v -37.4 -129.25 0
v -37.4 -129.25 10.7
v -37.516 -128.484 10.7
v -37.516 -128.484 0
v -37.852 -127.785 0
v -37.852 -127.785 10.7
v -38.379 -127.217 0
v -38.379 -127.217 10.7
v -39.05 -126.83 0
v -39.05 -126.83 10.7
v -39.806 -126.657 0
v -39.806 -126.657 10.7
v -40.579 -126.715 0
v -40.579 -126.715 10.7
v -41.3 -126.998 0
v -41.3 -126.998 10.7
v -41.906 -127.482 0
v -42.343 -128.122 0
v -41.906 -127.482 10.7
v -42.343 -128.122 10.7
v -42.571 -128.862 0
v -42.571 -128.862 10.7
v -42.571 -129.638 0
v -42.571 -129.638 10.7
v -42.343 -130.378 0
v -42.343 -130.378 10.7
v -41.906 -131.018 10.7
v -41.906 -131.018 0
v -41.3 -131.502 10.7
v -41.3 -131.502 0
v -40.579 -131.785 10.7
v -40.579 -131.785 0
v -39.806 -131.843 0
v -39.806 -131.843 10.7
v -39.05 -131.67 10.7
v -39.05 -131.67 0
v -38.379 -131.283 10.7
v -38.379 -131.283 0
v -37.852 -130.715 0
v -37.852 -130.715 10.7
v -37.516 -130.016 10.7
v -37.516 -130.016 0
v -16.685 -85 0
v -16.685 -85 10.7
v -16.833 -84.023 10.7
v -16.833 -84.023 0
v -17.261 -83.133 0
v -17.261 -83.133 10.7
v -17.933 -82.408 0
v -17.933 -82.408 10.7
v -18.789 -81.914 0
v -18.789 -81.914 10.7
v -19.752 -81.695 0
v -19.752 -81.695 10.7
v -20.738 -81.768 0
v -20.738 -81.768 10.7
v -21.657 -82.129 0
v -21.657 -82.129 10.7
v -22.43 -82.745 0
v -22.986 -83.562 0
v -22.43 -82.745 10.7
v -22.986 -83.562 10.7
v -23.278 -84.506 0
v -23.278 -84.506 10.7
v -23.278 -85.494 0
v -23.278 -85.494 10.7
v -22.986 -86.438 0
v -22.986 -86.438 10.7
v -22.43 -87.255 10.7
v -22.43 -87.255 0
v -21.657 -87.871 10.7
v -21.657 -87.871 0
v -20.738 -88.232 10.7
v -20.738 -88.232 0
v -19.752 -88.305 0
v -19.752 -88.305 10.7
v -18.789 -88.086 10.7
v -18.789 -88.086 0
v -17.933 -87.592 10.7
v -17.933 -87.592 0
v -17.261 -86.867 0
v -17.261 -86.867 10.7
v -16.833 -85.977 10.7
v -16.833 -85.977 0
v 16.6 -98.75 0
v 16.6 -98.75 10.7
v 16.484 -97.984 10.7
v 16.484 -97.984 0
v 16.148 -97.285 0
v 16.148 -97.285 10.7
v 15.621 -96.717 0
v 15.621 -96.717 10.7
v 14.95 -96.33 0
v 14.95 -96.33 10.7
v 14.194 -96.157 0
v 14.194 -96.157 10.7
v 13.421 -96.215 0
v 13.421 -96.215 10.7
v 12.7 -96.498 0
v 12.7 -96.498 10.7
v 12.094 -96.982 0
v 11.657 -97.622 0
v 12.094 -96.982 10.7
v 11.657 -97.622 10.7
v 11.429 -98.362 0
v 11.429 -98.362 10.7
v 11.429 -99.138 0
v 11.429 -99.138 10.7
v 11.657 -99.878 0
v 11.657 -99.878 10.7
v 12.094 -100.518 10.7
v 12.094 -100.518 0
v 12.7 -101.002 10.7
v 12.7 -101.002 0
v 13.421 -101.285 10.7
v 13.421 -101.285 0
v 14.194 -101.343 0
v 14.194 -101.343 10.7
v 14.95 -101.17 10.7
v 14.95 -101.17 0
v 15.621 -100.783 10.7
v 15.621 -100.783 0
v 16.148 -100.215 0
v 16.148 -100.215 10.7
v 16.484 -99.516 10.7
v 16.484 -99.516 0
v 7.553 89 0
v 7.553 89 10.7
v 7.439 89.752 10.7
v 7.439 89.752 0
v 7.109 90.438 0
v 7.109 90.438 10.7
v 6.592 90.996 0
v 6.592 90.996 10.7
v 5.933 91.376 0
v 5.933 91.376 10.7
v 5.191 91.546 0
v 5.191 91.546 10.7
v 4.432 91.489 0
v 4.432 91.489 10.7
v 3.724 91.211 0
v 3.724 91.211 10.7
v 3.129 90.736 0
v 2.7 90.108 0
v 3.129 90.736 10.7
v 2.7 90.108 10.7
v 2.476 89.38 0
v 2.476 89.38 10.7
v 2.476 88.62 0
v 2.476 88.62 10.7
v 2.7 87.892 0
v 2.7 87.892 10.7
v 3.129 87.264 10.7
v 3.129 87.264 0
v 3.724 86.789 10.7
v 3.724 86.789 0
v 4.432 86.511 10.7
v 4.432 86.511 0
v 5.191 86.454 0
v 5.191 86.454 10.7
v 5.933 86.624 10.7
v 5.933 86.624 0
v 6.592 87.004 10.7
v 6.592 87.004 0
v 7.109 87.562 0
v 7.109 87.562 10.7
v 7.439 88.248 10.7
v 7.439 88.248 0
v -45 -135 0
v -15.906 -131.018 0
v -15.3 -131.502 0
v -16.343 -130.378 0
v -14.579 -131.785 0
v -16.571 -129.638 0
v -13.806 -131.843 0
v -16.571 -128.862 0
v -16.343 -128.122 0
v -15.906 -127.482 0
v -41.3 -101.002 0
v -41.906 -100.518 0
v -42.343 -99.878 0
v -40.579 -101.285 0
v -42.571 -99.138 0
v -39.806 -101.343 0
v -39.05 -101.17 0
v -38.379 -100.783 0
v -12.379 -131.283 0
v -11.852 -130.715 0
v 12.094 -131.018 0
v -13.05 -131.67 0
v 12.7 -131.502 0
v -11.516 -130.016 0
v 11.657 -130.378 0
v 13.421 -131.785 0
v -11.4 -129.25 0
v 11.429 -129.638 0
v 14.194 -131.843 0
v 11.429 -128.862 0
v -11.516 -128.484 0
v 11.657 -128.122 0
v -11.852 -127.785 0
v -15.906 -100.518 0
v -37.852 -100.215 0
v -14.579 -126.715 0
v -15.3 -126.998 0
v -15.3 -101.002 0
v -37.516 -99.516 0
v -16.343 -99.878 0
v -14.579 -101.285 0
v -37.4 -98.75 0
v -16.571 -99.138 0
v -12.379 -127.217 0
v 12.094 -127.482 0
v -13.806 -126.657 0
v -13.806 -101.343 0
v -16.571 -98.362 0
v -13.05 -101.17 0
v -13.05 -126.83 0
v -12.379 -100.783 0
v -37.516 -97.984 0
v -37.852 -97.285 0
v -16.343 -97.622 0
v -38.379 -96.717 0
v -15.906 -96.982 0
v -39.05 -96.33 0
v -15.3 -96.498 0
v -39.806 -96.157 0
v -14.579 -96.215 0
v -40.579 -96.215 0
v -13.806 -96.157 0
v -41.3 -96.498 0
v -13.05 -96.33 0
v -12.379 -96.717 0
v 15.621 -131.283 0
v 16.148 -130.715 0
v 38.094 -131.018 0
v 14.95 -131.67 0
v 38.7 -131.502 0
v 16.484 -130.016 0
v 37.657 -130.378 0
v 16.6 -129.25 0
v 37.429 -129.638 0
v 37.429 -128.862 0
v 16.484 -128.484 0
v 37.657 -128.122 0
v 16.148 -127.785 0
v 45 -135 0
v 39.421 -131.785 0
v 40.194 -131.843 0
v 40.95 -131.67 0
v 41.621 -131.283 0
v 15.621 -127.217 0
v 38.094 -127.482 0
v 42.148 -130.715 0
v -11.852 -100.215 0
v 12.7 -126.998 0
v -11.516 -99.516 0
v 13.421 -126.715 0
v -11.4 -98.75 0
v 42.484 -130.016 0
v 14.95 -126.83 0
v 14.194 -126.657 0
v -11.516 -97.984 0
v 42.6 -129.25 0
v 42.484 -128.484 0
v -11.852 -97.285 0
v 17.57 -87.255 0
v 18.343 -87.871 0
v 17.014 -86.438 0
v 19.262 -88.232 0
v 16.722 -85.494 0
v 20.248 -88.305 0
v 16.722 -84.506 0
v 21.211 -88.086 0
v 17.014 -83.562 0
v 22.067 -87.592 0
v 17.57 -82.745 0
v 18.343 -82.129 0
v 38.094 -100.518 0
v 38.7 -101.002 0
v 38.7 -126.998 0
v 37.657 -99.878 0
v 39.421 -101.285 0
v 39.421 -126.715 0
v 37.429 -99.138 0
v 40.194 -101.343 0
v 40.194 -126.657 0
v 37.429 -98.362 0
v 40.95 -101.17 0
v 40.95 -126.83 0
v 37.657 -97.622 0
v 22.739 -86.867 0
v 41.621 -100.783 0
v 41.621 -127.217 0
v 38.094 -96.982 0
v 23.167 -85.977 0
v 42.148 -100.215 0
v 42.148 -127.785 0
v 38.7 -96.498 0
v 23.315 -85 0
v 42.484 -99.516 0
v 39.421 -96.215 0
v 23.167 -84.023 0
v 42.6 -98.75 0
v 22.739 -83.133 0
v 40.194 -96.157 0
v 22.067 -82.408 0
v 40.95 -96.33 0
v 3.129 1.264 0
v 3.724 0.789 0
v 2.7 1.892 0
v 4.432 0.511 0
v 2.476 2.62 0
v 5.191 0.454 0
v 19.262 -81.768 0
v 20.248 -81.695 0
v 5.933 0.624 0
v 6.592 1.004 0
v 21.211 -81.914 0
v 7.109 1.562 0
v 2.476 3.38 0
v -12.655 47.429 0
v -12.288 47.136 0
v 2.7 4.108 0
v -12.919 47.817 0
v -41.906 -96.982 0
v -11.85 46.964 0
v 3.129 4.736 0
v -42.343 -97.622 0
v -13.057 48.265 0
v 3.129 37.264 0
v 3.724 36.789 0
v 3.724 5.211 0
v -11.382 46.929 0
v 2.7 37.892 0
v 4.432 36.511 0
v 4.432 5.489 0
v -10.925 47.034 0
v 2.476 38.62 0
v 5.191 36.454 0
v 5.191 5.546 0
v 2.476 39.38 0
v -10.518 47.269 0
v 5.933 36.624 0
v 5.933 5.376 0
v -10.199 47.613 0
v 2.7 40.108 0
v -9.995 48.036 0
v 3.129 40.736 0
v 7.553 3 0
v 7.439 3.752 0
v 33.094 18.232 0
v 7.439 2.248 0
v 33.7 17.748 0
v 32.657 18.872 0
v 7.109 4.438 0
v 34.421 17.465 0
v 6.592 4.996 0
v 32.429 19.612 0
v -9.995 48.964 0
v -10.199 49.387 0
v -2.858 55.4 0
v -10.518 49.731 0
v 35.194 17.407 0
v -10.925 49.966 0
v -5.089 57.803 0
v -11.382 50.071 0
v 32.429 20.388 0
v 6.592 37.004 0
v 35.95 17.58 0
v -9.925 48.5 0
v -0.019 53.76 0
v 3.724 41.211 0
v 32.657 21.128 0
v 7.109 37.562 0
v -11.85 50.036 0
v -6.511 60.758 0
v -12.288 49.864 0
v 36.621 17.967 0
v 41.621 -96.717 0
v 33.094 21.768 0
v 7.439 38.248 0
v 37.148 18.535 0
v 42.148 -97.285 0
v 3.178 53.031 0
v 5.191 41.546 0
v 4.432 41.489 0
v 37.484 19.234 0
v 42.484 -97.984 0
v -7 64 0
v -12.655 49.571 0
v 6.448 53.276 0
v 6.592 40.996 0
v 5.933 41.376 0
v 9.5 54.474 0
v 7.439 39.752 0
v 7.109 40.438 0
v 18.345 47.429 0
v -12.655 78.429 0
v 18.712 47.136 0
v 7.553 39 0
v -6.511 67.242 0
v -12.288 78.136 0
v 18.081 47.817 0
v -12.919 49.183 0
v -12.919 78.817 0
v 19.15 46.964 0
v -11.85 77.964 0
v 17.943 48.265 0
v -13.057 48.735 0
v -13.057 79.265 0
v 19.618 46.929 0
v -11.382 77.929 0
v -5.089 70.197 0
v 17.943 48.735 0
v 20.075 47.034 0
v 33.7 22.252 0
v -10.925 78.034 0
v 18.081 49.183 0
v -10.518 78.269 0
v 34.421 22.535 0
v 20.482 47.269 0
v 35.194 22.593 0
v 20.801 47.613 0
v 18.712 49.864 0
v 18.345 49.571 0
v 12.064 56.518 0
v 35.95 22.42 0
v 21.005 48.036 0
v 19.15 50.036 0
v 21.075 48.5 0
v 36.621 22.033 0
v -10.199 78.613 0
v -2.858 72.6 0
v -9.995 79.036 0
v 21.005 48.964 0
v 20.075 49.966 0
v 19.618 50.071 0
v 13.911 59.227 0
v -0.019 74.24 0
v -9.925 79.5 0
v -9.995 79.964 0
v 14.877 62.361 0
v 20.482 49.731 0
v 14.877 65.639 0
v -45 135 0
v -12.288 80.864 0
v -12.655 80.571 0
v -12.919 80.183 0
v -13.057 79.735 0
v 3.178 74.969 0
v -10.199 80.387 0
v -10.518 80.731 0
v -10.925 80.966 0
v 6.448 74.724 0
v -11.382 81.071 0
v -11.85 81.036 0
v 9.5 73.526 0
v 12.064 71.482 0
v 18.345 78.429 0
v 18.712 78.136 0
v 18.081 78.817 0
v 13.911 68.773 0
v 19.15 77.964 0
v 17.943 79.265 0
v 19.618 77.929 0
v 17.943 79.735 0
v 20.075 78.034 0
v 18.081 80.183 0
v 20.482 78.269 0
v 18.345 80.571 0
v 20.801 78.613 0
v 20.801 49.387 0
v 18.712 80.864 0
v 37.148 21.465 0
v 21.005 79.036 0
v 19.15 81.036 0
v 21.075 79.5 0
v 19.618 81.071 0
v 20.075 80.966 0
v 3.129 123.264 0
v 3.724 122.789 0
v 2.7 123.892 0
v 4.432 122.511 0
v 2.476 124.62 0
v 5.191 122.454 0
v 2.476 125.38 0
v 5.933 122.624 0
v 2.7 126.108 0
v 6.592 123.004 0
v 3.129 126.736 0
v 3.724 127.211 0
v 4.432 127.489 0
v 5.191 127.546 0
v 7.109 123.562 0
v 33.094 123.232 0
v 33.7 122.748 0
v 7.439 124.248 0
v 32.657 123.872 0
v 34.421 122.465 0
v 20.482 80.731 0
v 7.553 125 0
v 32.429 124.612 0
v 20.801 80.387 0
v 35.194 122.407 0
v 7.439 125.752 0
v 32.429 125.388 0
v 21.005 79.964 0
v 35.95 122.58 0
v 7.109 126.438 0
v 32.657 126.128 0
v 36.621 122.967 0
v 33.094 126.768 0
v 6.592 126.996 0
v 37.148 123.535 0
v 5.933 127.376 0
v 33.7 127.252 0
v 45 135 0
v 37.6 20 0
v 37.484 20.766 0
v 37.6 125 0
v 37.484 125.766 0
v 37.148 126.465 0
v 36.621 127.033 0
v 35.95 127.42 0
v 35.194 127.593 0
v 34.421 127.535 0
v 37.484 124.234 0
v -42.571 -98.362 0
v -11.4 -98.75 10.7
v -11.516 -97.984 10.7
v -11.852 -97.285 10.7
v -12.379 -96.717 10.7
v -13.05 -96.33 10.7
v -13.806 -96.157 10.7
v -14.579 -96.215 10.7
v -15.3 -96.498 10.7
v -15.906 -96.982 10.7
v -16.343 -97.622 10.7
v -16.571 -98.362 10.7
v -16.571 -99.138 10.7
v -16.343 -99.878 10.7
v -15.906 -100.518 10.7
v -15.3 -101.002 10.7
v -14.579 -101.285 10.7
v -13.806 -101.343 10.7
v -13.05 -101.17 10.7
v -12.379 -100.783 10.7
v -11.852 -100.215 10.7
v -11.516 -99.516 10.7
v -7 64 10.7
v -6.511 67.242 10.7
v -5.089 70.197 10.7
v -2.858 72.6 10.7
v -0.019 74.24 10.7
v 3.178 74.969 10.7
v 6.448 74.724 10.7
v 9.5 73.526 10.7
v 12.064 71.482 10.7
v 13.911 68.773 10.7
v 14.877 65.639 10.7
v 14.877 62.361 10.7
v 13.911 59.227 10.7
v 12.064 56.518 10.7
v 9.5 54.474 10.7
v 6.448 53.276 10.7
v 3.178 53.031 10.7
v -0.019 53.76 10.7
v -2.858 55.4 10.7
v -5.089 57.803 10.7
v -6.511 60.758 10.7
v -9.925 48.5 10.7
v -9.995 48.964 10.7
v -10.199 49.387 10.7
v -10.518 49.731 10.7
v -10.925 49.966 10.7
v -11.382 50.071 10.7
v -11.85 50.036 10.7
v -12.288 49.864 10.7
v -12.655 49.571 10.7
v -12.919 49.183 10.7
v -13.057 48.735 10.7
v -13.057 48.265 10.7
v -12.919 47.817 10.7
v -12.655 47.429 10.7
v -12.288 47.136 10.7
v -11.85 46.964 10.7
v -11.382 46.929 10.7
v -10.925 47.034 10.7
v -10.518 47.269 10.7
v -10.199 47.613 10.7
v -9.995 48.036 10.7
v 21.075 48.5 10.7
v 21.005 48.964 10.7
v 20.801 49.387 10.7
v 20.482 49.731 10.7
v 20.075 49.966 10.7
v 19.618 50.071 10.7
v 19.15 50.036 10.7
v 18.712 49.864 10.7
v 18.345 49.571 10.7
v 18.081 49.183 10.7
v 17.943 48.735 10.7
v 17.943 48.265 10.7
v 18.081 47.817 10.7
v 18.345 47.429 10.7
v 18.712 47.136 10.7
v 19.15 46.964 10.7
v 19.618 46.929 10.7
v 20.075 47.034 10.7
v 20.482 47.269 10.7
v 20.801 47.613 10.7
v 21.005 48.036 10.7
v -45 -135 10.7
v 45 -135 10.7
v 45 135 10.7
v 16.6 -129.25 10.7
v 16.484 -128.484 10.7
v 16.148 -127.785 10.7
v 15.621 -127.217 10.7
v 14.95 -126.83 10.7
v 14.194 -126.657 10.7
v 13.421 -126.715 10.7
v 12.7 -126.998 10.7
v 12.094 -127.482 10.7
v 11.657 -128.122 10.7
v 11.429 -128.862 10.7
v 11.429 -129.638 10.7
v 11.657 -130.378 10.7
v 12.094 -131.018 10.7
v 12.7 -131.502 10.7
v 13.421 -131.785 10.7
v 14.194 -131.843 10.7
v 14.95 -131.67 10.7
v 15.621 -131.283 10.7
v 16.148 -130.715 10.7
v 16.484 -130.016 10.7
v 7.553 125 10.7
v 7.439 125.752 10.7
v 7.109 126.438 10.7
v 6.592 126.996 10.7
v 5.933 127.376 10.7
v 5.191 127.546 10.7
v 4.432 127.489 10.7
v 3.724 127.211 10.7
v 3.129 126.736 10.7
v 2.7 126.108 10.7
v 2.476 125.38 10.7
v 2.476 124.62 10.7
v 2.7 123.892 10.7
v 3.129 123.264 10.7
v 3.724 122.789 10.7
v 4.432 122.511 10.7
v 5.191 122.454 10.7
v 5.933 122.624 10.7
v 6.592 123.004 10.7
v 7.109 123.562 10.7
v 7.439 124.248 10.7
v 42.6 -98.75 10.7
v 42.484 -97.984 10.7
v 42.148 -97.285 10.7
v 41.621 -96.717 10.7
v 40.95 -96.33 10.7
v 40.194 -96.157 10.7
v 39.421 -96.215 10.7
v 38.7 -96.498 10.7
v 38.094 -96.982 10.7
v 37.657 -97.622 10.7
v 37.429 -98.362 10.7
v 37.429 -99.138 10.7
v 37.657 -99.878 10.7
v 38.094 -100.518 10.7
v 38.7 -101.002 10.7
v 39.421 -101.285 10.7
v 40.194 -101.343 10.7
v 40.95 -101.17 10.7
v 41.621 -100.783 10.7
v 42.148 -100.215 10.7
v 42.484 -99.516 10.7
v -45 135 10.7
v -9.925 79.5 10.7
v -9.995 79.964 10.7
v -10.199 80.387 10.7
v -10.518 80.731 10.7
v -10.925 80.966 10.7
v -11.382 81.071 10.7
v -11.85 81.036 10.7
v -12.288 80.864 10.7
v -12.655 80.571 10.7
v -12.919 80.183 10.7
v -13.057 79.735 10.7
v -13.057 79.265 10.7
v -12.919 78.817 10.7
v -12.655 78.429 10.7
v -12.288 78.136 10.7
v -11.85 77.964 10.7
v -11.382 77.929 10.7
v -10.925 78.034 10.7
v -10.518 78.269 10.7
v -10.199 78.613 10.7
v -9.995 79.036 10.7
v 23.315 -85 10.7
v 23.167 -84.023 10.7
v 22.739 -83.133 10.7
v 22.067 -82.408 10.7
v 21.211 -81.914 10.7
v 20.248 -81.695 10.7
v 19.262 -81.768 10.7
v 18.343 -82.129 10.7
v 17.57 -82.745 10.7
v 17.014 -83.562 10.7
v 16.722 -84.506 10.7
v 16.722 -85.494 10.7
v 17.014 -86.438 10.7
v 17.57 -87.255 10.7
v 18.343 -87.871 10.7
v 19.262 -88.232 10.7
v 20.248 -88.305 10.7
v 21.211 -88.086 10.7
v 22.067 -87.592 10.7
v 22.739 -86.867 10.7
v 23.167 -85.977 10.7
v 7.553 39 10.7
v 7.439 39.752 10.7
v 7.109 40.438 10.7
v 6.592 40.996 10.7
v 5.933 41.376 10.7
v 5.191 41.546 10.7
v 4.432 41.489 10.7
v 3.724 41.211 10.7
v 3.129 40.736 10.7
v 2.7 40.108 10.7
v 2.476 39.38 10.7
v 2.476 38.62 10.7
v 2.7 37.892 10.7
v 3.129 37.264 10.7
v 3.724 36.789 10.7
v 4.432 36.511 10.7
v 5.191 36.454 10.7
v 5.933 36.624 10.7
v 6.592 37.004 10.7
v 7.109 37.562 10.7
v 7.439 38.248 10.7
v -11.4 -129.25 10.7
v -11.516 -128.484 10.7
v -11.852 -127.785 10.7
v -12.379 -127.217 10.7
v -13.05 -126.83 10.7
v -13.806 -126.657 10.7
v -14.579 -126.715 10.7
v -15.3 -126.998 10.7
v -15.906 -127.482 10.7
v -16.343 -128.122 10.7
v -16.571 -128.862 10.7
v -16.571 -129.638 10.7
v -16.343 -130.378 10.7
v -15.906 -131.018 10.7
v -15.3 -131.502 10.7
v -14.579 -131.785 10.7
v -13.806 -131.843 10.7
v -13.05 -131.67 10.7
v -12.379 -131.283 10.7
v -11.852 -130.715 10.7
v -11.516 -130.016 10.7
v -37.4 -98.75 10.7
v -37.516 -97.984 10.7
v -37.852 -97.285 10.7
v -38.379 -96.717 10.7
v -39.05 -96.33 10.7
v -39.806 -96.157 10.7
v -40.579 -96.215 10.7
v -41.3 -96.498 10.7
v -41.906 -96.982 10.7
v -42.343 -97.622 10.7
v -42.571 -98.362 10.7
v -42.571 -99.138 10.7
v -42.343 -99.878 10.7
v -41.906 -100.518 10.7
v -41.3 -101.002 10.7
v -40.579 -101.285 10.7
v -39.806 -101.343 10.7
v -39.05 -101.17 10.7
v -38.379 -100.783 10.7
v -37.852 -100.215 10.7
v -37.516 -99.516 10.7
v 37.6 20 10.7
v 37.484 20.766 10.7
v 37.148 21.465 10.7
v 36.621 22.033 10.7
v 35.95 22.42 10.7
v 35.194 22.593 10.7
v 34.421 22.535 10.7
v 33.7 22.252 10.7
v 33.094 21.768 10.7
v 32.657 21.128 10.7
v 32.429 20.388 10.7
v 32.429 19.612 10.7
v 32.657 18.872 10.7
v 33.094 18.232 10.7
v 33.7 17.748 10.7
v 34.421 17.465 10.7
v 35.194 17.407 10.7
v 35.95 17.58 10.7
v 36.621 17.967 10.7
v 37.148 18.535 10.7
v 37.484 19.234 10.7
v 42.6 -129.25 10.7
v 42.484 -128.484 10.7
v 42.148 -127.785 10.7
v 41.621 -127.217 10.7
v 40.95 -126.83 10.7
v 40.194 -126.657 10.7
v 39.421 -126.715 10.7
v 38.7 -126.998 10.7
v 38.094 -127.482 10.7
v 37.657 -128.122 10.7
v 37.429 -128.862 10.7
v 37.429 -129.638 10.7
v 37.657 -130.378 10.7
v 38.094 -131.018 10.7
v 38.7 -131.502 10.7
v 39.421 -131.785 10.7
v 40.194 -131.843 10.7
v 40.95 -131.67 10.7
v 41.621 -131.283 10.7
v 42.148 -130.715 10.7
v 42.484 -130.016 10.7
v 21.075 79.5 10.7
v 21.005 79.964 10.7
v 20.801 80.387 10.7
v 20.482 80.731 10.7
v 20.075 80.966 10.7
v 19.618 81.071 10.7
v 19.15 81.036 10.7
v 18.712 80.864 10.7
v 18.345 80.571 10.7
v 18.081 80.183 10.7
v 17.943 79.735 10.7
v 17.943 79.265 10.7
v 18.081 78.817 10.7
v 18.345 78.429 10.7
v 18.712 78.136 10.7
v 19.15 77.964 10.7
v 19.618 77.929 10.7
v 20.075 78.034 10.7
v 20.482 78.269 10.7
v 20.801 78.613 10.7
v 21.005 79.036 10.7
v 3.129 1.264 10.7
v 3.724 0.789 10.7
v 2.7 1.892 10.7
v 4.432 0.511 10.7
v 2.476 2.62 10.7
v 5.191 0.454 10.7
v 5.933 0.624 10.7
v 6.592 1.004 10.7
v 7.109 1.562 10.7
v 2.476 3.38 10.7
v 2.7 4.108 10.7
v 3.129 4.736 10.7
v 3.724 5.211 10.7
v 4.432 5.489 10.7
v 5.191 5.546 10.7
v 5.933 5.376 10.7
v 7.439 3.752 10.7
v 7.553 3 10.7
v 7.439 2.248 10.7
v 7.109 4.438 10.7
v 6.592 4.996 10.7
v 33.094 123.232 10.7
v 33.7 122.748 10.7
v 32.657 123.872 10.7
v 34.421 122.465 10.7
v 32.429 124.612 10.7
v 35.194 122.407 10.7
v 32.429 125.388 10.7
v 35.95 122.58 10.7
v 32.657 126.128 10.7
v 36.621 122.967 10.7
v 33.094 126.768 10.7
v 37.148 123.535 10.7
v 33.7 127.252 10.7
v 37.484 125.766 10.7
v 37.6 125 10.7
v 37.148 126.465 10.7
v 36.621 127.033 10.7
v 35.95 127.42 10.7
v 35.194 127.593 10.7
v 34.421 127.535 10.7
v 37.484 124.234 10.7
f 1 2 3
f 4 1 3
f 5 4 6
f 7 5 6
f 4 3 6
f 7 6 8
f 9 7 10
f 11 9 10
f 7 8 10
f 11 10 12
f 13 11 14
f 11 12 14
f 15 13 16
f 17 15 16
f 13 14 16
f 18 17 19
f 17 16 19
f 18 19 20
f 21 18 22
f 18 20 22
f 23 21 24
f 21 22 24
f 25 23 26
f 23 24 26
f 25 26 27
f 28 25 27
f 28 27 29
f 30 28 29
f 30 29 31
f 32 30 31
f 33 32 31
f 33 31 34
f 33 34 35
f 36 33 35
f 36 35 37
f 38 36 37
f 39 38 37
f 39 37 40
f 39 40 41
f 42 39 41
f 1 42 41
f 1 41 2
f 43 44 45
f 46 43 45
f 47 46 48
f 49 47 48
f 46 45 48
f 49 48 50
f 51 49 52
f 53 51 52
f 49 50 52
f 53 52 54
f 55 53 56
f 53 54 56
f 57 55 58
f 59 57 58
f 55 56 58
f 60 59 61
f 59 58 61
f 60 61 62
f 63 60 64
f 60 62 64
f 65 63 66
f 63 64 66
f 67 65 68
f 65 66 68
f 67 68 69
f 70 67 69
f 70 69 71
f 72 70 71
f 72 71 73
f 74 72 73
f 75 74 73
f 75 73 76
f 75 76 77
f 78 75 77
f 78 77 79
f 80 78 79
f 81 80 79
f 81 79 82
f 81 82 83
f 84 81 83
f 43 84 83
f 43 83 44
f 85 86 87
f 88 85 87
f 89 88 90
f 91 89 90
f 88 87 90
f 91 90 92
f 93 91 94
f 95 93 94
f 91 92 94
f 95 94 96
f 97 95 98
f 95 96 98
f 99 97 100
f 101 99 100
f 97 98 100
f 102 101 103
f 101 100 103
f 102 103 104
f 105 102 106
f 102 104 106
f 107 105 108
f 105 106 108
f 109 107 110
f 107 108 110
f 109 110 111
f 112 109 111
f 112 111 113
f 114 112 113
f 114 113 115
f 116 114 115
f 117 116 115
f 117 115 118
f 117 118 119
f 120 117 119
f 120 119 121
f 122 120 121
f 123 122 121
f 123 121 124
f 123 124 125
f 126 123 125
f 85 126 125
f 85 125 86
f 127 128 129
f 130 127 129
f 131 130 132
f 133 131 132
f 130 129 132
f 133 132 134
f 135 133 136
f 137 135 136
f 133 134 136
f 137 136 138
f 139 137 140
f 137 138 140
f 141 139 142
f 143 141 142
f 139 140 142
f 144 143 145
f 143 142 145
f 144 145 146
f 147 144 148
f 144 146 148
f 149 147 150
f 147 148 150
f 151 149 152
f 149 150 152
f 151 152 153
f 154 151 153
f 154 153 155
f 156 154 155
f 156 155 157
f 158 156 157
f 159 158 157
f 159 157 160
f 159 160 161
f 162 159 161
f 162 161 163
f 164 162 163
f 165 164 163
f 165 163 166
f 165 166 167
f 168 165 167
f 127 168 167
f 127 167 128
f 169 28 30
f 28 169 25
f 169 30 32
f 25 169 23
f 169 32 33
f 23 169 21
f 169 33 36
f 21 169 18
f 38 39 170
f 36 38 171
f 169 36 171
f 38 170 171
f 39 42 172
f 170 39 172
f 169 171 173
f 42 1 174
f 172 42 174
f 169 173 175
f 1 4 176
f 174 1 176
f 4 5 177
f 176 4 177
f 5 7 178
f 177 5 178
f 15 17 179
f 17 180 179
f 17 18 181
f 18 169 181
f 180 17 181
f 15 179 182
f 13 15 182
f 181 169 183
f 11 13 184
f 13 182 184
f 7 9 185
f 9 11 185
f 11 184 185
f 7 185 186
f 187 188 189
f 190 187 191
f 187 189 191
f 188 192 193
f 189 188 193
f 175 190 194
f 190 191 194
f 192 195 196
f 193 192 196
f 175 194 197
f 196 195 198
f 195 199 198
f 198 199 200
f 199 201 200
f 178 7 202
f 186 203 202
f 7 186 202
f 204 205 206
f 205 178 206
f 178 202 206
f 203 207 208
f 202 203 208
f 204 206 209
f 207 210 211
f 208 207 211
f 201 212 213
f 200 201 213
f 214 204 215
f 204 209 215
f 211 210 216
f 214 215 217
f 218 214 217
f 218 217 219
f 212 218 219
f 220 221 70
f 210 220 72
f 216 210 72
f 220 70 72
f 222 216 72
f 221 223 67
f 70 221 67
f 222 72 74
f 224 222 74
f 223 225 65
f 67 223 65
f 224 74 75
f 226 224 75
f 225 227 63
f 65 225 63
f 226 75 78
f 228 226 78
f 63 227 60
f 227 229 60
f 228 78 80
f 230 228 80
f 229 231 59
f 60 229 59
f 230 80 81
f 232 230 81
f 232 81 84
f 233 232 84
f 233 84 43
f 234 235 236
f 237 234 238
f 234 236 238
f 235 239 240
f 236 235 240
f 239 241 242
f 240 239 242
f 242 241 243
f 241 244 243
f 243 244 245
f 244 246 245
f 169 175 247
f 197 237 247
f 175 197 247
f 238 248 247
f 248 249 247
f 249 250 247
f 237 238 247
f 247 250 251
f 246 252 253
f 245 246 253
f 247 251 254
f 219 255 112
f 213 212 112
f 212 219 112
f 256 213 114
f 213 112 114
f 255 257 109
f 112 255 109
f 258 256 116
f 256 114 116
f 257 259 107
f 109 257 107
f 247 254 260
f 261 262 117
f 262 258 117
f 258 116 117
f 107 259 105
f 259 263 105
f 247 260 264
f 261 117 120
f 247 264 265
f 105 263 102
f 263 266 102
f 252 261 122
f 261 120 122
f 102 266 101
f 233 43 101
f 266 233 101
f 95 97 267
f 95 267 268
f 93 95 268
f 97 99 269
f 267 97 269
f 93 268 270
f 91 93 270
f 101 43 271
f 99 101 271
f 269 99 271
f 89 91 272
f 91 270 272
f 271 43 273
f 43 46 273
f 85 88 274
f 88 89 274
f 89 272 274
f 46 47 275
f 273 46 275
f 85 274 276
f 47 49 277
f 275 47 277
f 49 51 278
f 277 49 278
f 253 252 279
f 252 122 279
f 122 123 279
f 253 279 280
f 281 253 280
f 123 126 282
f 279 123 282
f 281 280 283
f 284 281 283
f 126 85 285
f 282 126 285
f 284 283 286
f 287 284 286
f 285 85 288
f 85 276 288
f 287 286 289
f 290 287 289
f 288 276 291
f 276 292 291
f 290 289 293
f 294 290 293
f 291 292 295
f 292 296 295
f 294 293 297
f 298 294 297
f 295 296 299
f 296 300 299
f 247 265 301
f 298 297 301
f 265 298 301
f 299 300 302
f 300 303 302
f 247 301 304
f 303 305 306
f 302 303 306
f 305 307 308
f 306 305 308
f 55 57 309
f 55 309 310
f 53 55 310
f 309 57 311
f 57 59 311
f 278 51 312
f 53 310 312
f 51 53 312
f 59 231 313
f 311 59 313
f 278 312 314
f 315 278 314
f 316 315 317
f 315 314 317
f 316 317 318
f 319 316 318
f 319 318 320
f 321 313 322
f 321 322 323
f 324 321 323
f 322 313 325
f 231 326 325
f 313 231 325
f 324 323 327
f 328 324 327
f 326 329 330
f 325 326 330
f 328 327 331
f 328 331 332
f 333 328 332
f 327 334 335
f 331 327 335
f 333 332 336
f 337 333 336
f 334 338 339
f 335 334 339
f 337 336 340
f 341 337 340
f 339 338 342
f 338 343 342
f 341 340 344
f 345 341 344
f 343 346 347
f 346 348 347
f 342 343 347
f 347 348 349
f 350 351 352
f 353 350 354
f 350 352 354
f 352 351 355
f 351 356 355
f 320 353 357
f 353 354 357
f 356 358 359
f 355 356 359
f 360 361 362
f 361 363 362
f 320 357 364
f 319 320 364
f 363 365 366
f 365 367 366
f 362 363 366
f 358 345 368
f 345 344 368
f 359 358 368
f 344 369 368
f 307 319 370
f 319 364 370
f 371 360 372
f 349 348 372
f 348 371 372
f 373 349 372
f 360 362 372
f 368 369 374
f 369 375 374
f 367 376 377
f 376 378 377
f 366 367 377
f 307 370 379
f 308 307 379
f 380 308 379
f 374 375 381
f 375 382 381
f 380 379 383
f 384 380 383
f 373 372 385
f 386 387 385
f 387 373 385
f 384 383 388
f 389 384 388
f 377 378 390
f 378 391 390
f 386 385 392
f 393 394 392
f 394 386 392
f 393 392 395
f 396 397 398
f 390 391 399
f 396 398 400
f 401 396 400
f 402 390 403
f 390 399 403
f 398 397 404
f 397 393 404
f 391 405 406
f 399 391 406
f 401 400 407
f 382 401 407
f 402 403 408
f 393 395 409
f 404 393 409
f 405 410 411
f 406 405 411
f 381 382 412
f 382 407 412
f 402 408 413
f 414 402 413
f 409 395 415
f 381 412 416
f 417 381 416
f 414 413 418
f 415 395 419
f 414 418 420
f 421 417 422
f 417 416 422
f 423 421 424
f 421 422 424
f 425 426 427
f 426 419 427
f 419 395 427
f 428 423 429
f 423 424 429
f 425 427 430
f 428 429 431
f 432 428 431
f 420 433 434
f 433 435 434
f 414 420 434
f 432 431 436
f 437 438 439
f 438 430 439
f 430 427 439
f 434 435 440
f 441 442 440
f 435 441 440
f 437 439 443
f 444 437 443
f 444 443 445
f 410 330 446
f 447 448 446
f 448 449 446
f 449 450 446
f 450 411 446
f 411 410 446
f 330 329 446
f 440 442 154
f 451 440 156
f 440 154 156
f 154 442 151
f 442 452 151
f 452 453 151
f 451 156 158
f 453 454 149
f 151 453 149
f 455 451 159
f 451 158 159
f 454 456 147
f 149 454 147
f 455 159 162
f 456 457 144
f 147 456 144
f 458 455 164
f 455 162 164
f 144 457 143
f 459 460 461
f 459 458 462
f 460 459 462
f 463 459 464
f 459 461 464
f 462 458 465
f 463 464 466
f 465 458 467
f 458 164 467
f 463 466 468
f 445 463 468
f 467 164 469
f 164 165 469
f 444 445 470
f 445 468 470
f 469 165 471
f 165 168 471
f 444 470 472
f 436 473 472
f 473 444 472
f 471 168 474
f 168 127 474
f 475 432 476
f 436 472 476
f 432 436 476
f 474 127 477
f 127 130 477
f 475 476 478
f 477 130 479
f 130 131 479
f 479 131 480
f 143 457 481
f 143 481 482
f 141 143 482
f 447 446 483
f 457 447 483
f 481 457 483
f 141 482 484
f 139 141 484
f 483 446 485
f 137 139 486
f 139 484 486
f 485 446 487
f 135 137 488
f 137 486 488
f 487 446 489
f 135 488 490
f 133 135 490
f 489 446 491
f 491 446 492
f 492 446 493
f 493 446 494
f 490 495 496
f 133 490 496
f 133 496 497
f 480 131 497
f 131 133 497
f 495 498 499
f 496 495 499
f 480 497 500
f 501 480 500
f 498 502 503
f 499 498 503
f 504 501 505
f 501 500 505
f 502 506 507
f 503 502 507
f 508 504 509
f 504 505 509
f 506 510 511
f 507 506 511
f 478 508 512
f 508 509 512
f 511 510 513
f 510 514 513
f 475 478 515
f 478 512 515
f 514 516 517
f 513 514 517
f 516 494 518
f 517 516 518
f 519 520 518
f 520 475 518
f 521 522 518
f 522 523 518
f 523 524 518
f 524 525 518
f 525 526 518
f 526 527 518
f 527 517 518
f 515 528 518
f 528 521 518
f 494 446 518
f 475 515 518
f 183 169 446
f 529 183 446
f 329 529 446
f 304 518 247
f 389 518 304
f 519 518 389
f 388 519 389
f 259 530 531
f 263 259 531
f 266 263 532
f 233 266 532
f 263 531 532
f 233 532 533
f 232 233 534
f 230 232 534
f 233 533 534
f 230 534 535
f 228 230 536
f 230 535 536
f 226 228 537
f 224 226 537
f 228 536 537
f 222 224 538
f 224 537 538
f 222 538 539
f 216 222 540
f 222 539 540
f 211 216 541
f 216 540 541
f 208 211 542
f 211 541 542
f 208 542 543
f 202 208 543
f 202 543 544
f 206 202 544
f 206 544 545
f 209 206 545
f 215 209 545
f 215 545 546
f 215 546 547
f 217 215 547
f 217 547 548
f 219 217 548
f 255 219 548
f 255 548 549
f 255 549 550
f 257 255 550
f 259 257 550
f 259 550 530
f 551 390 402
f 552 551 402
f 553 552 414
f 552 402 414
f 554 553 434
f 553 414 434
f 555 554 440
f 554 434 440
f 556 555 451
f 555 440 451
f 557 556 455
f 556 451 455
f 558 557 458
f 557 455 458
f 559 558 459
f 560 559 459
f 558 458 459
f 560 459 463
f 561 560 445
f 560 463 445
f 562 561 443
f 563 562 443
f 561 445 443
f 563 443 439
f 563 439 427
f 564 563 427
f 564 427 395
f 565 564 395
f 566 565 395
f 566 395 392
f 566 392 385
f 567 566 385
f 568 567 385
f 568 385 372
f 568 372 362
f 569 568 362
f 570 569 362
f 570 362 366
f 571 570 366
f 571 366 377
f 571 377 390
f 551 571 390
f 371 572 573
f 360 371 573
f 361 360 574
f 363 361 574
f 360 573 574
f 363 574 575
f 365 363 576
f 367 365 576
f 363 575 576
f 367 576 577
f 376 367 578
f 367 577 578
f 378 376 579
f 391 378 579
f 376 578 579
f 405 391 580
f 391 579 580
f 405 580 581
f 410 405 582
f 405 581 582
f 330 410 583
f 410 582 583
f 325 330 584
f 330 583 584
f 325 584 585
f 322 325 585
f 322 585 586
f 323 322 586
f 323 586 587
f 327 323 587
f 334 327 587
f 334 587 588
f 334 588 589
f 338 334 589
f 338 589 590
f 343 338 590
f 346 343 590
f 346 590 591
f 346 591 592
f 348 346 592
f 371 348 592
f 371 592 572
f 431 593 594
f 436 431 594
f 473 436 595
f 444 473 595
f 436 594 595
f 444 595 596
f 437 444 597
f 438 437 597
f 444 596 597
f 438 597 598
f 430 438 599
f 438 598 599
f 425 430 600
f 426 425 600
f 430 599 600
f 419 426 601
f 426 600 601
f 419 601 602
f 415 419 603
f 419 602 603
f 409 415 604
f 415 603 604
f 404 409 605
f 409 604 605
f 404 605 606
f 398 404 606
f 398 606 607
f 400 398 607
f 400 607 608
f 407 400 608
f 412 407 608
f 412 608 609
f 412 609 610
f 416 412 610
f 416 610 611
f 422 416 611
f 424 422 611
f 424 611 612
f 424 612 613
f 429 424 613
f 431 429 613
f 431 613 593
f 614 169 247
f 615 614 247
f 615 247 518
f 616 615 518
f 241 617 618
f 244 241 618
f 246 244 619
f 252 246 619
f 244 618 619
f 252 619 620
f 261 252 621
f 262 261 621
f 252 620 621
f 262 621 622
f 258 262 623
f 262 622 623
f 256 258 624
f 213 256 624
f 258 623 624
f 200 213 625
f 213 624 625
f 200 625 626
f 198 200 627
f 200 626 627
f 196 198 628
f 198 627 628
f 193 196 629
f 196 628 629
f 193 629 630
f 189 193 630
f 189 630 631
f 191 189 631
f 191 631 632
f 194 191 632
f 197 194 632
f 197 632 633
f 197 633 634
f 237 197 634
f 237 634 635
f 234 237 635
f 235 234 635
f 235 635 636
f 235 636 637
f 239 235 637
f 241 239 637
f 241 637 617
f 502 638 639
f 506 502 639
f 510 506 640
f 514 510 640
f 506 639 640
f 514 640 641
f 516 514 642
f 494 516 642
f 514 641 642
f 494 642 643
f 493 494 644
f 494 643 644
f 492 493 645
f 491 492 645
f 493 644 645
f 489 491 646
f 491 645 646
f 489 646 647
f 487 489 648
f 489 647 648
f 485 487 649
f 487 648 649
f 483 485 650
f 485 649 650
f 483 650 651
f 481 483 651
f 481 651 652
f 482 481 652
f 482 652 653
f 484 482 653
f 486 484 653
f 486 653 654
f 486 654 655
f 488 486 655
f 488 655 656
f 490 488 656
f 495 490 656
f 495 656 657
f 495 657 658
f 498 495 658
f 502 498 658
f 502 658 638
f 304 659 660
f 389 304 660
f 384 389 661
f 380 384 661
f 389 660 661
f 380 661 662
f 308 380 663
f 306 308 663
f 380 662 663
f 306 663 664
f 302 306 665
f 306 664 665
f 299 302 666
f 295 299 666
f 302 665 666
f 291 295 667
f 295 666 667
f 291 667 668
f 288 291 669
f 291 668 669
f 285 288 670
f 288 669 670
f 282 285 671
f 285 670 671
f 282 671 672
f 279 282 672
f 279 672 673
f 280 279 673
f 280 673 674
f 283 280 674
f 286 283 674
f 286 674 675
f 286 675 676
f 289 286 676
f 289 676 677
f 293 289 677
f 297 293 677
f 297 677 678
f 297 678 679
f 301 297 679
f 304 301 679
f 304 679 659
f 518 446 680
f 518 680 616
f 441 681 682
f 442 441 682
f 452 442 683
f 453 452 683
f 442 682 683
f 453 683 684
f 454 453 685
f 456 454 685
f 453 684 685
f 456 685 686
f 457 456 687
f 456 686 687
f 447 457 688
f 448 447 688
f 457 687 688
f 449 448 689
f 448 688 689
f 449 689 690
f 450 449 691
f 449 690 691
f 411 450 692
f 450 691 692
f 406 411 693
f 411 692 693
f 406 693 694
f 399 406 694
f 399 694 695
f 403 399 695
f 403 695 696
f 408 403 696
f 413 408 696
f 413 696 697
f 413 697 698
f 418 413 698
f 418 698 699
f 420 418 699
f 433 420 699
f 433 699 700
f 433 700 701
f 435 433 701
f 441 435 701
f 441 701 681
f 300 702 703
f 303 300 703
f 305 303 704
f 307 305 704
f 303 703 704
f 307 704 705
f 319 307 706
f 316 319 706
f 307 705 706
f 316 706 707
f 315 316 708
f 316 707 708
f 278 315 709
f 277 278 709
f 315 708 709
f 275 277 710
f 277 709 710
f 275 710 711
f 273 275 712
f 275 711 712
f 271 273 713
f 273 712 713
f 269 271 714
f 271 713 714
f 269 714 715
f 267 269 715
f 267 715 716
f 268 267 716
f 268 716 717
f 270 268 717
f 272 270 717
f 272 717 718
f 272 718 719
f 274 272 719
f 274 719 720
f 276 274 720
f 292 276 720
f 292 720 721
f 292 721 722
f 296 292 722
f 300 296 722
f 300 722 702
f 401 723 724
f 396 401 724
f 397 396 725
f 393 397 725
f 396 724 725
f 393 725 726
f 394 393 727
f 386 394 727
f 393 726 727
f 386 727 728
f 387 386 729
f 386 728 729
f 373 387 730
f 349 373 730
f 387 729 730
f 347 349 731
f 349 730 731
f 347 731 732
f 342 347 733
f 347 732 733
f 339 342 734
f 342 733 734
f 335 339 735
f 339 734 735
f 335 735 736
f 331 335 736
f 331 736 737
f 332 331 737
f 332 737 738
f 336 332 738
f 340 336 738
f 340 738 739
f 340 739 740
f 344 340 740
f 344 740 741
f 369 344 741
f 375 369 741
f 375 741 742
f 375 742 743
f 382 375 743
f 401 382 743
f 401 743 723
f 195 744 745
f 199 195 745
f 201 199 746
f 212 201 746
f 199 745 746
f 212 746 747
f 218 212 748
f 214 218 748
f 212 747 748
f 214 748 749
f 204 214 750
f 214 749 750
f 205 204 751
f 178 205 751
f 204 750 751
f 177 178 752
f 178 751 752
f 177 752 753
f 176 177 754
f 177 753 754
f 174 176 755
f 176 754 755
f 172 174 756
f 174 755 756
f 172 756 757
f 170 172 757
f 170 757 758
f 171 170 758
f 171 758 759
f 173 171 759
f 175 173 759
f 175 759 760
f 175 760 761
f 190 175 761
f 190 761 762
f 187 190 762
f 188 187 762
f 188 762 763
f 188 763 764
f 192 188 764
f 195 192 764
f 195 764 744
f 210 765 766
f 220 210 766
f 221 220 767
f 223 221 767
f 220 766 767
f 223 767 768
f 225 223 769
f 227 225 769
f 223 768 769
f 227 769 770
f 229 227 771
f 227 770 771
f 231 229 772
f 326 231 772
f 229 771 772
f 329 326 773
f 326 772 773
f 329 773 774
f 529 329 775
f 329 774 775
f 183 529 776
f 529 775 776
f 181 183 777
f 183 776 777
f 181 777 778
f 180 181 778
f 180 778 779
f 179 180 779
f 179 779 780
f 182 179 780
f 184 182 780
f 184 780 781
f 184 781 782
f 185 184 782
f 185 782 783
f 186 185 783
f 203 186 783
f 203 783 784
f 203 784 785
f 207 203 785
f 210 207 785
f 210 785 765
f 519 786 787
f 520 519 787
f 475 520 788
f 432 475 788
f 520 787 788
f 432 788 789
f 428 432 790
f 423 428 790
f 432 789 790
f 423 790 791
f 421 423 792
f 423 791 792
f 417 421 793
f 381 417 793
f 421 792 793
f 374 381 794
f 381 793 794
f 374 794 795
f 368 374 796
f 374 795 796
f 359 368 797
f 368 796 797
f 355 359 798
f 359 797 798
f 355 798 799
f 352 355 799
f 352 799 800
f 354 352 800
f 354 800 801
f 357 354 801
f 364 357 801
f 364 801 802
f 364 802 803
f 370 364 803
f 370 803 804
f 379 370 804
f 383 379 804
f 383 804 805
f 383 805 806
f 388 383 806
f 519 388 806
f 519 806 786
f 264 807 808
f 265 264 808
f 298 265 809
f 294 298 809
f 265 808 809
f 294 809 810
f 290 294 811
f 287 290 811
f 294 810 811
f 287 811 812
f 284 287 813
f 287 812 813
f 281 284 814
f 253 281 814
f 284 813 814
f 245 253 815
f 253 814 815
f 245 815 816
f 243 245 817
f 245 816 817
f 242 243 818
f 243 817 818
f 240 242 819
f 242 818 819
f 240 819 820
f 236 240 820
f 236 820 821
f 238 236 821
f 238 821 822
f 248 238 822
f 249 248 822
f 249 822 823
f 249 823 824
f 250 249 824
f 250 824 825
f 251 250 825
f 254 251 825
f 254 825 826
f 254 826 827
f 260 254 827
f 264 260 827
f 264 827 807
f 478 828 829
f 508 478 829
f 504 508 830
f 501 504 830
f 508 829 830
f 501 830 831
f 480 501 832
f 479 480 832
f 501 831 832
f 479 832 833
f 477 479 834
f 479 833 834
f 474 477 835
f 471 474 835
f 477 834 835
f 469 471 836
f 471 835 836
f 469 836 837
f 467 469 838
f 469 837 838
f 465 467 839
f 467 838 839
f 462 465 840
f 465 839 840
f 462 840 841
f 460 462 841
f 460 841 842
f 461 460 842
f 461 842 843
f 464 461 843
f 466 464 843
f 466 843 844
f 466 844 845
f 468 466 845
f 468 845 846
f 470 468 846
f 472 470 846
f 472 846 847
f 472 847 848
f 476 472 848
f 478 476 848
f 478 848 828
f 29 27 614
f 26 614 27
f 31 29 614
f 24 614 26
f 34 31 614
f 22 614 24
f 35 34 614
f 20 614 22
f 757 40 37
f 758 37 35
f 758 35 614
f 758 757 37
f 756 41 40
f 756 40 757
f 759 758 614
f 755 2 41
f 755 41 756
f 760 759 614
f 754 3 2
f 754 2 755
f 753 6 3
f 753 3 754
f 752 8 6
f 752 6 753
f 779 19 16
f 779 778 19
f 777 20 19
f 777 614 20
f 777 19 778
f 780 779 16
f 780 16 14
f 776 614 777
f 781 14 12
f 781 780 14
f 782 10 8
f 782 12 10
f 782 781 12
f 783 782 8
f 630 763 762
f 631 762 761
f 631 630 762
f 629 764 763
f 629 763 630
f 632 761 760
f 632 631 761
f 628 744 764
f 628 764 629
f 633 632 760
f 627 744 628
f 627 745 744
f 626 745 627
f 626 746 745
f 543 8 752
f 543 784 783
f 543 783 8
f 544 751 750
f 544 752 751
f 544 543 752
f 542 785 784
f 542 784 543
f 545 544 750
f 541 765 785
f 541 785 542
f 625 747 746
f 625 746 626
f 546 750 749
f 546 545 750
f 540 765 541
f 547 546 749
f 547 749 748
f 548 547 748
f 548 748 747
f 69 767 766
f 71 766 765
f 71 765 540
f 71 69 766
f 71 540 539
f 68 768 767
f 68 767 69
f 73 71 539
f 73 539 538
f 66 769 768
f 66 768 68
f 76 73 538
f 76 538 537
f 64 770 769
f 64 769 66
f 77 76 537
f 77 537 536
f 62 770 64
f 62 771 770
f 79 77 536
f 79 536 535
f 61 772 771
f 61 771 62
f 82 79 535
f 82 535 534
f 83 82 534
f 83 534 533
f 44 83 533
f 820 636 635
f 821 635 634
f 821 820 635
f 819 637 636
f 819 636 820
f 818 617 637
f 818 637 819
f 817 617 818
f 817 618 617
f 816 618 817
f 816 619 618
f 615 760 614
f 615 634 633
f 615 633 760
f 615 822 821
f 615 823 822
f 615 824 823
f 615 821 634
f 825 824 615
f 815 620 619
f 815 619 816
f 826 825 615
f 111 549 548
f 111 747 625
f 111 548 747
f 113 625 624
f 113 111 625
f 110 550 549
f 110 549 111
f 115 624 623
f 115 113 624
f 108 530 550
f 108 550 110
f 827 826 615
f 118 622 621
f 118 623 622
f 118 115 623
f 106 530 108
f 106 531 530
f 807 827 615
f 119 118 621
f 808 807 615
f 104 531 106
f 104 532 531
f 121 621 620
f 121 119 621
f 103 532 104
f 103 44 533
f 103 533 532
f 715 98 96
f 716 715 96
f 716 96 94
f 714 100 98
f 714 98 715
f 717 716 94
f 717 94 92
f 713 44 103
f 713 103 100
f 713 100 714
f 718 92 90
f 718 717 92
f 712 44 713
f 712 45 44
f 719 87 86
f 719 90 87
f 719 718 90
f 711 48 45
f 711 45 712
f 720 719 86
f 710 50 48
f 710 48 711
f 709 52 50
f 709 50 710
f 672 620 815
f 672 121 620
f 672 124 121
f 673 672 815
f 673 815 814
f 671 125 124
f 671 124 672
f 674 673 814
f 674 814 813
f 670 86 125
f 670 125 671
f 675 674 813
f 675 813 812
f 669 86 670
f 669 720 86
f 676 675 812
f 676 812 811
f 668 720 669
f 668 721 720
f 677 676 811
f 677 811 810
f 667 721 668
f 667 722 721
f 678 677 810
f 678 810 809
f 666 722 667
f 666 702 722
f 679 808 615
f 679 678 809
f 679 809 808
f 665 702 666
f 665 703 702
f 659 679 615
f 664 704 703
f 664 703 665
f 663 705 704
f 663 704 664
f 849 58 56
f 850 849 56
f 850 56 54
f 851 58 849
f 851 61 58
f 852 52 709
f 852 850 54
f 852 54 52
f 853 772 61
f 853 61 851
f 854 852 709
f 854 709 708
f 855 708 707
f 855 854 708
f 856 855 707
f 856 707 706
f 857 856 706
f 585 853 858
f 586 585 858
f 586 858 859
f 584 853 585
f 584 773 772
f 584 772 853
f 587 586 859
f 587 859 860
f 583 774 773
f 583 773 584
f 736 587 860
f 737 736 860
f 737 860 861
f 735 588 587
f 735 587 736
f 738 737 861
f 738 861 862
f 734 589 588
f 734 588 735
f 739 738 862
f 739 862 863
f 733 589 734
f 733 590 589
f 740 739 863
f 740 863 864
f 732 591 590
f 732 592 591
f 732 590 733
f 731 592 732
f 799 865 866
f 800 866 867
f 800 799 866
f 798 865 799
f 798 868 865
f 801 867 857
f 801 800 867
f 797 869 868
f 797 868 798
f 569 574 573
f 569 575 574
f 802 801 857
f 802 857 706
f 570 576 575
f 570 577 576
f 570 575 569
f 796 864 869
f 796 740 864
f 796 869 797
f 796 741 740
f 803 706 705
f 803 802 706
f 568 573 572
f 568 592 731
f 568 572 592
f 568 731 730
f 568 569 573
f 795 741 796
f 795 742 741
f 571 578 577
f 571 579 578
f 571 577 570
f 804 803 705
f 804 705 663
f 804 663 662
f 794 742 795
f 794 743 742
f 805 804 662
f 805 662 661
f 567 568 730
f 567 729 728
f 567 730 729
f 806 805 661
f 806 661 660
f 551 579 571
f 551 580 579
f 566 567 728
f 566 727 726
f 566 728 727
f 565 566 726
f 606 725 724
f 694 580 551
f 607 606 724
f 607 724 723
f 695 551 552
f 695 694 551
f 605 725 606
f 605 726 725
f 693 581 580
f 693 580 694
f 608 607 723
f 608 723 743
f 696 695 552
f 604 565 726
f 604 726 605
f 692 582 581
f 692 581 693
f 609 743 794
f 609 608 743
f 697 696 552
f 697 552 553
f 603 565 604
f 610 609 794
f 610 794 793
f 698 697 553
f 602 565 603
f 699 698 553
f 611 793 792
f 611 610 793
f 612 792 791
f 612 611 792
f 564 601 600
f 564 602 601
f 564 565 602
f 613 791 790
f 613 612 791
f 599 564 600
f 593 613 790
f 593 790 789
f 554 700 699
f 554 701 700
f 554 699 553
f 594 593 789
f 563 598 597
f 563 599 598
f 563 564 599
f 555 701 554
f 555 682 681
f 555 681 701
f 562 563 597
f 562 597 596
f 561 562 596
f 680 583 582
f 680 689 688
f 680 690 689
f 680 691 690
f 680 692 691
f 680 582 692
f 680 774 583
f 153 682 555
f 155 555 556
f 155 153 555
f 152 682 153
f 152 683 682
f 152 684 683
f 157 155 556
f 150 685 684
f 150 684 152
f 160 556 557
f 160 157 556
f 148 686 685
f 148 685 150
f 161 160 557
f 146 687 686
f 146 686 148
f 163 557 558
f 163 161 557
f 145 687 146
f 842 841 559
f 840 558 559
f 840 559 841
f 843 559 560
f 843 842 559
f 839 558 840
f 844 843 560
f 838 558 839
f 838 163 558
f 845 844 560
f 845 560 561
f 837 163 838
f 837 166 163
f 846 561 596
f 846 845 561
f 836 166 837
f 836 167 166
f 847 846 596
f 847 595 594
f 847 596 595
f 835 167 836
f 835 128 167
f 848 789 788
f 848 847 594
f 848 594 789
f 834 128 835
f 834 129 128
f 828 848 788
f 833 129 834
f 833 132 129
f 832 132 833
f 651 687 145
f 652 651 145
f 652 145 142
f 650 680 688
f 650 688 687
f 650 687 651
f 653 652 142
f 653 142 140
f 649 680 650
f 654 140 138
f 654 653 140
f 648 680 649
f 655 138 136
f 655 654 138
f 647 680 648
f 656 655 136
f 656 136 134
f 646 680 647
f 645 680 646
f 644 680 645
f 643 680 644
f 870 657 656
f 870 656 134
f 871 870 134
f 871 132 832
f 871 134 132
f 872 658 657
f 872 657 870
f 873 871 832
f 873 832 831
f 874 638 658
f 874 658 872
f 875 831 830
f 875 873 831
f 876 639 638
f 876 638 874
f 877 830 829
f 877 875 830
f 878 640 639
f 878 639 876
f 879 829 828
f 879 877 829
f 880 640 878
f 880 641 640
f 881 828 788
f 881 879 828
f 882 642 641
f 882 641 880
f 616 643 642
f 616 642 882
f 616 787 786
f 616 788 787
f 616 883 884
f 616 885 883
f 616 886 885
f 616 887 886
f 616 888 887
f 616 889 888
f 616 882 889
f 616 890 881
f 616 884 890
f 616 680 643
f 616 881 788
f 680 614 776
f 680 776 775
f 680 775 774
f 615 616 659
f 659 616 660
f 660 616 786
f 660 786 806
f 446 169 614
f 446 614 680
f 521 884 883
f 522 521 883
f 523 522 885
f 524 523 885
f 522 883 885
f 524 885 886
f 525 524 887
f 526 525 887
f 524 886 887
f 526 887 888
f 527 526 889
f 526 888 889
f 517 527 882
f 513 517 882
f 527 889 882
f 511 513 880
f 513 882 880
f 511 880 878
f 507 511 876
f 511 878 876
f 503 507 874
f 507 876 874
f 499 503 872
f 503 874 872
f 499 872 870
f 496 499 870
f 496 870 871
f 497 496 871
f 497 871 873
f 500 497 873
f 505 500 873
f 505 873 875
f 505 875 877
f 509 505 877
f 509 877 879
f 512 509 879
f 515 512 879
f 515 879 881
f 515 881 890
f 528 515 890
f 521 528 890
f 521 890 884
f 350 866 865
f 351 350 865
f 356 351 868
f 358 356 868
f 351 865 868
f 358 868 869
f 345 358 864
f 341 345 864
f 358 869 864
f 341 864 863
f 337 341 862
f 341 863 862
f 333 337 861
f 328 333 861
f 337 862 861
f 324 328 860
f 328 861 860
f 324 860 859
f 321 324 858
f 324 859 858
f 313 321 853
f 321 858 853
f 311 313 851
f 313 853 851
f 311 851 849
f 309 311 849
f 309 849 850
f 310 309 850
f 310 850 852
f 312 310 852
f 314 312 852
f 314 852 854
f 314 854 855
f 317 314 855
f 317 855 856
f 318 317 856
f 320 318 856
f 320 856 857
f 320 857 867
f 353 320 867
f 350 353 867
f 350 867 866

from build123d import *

# Parameters (mm, degrees)
ESBO_O1_W                               = 90
ESBO_O1_H                               = 270
RESSALTO_EXTRUS_O1_DEPTH                = 10.7
FURO_ROSCADO_PARA_CONDU_TE_DE_M5X0_81_D = 5.2
FURO_ROSCADO_PARA_CONDU_TE_DE_1_4_281_D = 6.6294
FURO_ROSCADO_PARA_CONDU_TE_DE_M5X0_82_D = 5.2
FURO_ROSCADO_PARA_CONDU_TE_DE_10_321_D  = 5.1054
ESBO_O14_R                              = 11
CORTE_EXTRUS_O1_DEPTH                   = 11.7
FURO_ROSCADO_PARA_CONDU_TE_DE_M3X0_51_D = 3.15


with BuildPart() as part:
    # Esboço1 → Ressalto-extrusão1 (new body)
    with BuildSketch(Plane.XY):
        Rectangle(ESBO_O1_W, ESBO_O1_H)
    extrude(amount=RESSALTO_EXTRUS_O1_DEPTH)

    # Furo roscado para conduíte de M5x0.81 (through all)
    with Locations(Plane(origin=(0, 0, 0), x_dir=(-1, 0, 0), z_dir=(0, 0, -1))):
        with Locations((-40, -98.75), (-14, -98.75), (-40, -129.25), (-14, -129.25), (14, -129.25), (40, -129.25), (14, -98.75), (40, -98.75)):
            Hole(FURO_ROSCADO_PARA_CONDU_TE_DE_M5X0_81_D / 2)

    # Furo roscado para conduíte de 1/4-281 (through all)
    with Locations(Plane(origin=(0, 0, 0), x_dir=(-1, 0, 0), z_dir=(0, 0, -1))):
        with Locations((-20, -85), (20, -85)):
            Hole(FURO_ROSCADO_PARA_CONDU_TE_DE_1_4_281_D / 2)

    # Furo roscado para conduíte de M5x0.82 (through all)
    with Locations(Plane(origin=(0, 0, 0), x_dir=(-1, 0, 0), z_dir=(0, 0, -1))):
        with Locations((-35, 125), (-35, 20)):
            Hole(FURO_ROSCADO_PARA_CONDU_TE_DE_M5X0_82_D / 2)

    # Furo roscado para conduíte de #10-321 (through all)
    with Locations(Plane(origin=(0, 0, 0), x_dir=(-1, 0, 0), z_dir=(0, 0, -1))):
        with Locations((-5, 125), (-5, 89), (-5, 39), (-5, 3)):
            Hole(FURO_ROSCADO_PARA_CONDU_TE_DE_10_321_D / 2)

    # Esboço14 → Corte-extrusão1 (cut, through all)
    with BuildSketch(Plane(origin=(0, 0, 0), x_dir=(-1, 0, 0), z_dir=(0, 0, -1))):
        with Locations((-4, 64)):
            Circle(ESBO_O14_R)
    extrude(amount=-CORTE_EXTRUS_O1_DEPTH, mode=Mode.SUBTRACT)

    # Furo roscado para conduíte de M3x0.51 (through all)
    with Locations(Plane(origin=(0, 0, 0), x_dir=(-1, 0, 0), z_dir=(0, 0, -1))):
        with Locations((-19.5, 79.5), (-19.5, 48.5), (11.5, 79.5), (11.5, 48.5)):
            Hole(FURO_ROSCADO_PARA_CONDU_TE_DE_M3X0_51_D / 2)


solid = part.part
